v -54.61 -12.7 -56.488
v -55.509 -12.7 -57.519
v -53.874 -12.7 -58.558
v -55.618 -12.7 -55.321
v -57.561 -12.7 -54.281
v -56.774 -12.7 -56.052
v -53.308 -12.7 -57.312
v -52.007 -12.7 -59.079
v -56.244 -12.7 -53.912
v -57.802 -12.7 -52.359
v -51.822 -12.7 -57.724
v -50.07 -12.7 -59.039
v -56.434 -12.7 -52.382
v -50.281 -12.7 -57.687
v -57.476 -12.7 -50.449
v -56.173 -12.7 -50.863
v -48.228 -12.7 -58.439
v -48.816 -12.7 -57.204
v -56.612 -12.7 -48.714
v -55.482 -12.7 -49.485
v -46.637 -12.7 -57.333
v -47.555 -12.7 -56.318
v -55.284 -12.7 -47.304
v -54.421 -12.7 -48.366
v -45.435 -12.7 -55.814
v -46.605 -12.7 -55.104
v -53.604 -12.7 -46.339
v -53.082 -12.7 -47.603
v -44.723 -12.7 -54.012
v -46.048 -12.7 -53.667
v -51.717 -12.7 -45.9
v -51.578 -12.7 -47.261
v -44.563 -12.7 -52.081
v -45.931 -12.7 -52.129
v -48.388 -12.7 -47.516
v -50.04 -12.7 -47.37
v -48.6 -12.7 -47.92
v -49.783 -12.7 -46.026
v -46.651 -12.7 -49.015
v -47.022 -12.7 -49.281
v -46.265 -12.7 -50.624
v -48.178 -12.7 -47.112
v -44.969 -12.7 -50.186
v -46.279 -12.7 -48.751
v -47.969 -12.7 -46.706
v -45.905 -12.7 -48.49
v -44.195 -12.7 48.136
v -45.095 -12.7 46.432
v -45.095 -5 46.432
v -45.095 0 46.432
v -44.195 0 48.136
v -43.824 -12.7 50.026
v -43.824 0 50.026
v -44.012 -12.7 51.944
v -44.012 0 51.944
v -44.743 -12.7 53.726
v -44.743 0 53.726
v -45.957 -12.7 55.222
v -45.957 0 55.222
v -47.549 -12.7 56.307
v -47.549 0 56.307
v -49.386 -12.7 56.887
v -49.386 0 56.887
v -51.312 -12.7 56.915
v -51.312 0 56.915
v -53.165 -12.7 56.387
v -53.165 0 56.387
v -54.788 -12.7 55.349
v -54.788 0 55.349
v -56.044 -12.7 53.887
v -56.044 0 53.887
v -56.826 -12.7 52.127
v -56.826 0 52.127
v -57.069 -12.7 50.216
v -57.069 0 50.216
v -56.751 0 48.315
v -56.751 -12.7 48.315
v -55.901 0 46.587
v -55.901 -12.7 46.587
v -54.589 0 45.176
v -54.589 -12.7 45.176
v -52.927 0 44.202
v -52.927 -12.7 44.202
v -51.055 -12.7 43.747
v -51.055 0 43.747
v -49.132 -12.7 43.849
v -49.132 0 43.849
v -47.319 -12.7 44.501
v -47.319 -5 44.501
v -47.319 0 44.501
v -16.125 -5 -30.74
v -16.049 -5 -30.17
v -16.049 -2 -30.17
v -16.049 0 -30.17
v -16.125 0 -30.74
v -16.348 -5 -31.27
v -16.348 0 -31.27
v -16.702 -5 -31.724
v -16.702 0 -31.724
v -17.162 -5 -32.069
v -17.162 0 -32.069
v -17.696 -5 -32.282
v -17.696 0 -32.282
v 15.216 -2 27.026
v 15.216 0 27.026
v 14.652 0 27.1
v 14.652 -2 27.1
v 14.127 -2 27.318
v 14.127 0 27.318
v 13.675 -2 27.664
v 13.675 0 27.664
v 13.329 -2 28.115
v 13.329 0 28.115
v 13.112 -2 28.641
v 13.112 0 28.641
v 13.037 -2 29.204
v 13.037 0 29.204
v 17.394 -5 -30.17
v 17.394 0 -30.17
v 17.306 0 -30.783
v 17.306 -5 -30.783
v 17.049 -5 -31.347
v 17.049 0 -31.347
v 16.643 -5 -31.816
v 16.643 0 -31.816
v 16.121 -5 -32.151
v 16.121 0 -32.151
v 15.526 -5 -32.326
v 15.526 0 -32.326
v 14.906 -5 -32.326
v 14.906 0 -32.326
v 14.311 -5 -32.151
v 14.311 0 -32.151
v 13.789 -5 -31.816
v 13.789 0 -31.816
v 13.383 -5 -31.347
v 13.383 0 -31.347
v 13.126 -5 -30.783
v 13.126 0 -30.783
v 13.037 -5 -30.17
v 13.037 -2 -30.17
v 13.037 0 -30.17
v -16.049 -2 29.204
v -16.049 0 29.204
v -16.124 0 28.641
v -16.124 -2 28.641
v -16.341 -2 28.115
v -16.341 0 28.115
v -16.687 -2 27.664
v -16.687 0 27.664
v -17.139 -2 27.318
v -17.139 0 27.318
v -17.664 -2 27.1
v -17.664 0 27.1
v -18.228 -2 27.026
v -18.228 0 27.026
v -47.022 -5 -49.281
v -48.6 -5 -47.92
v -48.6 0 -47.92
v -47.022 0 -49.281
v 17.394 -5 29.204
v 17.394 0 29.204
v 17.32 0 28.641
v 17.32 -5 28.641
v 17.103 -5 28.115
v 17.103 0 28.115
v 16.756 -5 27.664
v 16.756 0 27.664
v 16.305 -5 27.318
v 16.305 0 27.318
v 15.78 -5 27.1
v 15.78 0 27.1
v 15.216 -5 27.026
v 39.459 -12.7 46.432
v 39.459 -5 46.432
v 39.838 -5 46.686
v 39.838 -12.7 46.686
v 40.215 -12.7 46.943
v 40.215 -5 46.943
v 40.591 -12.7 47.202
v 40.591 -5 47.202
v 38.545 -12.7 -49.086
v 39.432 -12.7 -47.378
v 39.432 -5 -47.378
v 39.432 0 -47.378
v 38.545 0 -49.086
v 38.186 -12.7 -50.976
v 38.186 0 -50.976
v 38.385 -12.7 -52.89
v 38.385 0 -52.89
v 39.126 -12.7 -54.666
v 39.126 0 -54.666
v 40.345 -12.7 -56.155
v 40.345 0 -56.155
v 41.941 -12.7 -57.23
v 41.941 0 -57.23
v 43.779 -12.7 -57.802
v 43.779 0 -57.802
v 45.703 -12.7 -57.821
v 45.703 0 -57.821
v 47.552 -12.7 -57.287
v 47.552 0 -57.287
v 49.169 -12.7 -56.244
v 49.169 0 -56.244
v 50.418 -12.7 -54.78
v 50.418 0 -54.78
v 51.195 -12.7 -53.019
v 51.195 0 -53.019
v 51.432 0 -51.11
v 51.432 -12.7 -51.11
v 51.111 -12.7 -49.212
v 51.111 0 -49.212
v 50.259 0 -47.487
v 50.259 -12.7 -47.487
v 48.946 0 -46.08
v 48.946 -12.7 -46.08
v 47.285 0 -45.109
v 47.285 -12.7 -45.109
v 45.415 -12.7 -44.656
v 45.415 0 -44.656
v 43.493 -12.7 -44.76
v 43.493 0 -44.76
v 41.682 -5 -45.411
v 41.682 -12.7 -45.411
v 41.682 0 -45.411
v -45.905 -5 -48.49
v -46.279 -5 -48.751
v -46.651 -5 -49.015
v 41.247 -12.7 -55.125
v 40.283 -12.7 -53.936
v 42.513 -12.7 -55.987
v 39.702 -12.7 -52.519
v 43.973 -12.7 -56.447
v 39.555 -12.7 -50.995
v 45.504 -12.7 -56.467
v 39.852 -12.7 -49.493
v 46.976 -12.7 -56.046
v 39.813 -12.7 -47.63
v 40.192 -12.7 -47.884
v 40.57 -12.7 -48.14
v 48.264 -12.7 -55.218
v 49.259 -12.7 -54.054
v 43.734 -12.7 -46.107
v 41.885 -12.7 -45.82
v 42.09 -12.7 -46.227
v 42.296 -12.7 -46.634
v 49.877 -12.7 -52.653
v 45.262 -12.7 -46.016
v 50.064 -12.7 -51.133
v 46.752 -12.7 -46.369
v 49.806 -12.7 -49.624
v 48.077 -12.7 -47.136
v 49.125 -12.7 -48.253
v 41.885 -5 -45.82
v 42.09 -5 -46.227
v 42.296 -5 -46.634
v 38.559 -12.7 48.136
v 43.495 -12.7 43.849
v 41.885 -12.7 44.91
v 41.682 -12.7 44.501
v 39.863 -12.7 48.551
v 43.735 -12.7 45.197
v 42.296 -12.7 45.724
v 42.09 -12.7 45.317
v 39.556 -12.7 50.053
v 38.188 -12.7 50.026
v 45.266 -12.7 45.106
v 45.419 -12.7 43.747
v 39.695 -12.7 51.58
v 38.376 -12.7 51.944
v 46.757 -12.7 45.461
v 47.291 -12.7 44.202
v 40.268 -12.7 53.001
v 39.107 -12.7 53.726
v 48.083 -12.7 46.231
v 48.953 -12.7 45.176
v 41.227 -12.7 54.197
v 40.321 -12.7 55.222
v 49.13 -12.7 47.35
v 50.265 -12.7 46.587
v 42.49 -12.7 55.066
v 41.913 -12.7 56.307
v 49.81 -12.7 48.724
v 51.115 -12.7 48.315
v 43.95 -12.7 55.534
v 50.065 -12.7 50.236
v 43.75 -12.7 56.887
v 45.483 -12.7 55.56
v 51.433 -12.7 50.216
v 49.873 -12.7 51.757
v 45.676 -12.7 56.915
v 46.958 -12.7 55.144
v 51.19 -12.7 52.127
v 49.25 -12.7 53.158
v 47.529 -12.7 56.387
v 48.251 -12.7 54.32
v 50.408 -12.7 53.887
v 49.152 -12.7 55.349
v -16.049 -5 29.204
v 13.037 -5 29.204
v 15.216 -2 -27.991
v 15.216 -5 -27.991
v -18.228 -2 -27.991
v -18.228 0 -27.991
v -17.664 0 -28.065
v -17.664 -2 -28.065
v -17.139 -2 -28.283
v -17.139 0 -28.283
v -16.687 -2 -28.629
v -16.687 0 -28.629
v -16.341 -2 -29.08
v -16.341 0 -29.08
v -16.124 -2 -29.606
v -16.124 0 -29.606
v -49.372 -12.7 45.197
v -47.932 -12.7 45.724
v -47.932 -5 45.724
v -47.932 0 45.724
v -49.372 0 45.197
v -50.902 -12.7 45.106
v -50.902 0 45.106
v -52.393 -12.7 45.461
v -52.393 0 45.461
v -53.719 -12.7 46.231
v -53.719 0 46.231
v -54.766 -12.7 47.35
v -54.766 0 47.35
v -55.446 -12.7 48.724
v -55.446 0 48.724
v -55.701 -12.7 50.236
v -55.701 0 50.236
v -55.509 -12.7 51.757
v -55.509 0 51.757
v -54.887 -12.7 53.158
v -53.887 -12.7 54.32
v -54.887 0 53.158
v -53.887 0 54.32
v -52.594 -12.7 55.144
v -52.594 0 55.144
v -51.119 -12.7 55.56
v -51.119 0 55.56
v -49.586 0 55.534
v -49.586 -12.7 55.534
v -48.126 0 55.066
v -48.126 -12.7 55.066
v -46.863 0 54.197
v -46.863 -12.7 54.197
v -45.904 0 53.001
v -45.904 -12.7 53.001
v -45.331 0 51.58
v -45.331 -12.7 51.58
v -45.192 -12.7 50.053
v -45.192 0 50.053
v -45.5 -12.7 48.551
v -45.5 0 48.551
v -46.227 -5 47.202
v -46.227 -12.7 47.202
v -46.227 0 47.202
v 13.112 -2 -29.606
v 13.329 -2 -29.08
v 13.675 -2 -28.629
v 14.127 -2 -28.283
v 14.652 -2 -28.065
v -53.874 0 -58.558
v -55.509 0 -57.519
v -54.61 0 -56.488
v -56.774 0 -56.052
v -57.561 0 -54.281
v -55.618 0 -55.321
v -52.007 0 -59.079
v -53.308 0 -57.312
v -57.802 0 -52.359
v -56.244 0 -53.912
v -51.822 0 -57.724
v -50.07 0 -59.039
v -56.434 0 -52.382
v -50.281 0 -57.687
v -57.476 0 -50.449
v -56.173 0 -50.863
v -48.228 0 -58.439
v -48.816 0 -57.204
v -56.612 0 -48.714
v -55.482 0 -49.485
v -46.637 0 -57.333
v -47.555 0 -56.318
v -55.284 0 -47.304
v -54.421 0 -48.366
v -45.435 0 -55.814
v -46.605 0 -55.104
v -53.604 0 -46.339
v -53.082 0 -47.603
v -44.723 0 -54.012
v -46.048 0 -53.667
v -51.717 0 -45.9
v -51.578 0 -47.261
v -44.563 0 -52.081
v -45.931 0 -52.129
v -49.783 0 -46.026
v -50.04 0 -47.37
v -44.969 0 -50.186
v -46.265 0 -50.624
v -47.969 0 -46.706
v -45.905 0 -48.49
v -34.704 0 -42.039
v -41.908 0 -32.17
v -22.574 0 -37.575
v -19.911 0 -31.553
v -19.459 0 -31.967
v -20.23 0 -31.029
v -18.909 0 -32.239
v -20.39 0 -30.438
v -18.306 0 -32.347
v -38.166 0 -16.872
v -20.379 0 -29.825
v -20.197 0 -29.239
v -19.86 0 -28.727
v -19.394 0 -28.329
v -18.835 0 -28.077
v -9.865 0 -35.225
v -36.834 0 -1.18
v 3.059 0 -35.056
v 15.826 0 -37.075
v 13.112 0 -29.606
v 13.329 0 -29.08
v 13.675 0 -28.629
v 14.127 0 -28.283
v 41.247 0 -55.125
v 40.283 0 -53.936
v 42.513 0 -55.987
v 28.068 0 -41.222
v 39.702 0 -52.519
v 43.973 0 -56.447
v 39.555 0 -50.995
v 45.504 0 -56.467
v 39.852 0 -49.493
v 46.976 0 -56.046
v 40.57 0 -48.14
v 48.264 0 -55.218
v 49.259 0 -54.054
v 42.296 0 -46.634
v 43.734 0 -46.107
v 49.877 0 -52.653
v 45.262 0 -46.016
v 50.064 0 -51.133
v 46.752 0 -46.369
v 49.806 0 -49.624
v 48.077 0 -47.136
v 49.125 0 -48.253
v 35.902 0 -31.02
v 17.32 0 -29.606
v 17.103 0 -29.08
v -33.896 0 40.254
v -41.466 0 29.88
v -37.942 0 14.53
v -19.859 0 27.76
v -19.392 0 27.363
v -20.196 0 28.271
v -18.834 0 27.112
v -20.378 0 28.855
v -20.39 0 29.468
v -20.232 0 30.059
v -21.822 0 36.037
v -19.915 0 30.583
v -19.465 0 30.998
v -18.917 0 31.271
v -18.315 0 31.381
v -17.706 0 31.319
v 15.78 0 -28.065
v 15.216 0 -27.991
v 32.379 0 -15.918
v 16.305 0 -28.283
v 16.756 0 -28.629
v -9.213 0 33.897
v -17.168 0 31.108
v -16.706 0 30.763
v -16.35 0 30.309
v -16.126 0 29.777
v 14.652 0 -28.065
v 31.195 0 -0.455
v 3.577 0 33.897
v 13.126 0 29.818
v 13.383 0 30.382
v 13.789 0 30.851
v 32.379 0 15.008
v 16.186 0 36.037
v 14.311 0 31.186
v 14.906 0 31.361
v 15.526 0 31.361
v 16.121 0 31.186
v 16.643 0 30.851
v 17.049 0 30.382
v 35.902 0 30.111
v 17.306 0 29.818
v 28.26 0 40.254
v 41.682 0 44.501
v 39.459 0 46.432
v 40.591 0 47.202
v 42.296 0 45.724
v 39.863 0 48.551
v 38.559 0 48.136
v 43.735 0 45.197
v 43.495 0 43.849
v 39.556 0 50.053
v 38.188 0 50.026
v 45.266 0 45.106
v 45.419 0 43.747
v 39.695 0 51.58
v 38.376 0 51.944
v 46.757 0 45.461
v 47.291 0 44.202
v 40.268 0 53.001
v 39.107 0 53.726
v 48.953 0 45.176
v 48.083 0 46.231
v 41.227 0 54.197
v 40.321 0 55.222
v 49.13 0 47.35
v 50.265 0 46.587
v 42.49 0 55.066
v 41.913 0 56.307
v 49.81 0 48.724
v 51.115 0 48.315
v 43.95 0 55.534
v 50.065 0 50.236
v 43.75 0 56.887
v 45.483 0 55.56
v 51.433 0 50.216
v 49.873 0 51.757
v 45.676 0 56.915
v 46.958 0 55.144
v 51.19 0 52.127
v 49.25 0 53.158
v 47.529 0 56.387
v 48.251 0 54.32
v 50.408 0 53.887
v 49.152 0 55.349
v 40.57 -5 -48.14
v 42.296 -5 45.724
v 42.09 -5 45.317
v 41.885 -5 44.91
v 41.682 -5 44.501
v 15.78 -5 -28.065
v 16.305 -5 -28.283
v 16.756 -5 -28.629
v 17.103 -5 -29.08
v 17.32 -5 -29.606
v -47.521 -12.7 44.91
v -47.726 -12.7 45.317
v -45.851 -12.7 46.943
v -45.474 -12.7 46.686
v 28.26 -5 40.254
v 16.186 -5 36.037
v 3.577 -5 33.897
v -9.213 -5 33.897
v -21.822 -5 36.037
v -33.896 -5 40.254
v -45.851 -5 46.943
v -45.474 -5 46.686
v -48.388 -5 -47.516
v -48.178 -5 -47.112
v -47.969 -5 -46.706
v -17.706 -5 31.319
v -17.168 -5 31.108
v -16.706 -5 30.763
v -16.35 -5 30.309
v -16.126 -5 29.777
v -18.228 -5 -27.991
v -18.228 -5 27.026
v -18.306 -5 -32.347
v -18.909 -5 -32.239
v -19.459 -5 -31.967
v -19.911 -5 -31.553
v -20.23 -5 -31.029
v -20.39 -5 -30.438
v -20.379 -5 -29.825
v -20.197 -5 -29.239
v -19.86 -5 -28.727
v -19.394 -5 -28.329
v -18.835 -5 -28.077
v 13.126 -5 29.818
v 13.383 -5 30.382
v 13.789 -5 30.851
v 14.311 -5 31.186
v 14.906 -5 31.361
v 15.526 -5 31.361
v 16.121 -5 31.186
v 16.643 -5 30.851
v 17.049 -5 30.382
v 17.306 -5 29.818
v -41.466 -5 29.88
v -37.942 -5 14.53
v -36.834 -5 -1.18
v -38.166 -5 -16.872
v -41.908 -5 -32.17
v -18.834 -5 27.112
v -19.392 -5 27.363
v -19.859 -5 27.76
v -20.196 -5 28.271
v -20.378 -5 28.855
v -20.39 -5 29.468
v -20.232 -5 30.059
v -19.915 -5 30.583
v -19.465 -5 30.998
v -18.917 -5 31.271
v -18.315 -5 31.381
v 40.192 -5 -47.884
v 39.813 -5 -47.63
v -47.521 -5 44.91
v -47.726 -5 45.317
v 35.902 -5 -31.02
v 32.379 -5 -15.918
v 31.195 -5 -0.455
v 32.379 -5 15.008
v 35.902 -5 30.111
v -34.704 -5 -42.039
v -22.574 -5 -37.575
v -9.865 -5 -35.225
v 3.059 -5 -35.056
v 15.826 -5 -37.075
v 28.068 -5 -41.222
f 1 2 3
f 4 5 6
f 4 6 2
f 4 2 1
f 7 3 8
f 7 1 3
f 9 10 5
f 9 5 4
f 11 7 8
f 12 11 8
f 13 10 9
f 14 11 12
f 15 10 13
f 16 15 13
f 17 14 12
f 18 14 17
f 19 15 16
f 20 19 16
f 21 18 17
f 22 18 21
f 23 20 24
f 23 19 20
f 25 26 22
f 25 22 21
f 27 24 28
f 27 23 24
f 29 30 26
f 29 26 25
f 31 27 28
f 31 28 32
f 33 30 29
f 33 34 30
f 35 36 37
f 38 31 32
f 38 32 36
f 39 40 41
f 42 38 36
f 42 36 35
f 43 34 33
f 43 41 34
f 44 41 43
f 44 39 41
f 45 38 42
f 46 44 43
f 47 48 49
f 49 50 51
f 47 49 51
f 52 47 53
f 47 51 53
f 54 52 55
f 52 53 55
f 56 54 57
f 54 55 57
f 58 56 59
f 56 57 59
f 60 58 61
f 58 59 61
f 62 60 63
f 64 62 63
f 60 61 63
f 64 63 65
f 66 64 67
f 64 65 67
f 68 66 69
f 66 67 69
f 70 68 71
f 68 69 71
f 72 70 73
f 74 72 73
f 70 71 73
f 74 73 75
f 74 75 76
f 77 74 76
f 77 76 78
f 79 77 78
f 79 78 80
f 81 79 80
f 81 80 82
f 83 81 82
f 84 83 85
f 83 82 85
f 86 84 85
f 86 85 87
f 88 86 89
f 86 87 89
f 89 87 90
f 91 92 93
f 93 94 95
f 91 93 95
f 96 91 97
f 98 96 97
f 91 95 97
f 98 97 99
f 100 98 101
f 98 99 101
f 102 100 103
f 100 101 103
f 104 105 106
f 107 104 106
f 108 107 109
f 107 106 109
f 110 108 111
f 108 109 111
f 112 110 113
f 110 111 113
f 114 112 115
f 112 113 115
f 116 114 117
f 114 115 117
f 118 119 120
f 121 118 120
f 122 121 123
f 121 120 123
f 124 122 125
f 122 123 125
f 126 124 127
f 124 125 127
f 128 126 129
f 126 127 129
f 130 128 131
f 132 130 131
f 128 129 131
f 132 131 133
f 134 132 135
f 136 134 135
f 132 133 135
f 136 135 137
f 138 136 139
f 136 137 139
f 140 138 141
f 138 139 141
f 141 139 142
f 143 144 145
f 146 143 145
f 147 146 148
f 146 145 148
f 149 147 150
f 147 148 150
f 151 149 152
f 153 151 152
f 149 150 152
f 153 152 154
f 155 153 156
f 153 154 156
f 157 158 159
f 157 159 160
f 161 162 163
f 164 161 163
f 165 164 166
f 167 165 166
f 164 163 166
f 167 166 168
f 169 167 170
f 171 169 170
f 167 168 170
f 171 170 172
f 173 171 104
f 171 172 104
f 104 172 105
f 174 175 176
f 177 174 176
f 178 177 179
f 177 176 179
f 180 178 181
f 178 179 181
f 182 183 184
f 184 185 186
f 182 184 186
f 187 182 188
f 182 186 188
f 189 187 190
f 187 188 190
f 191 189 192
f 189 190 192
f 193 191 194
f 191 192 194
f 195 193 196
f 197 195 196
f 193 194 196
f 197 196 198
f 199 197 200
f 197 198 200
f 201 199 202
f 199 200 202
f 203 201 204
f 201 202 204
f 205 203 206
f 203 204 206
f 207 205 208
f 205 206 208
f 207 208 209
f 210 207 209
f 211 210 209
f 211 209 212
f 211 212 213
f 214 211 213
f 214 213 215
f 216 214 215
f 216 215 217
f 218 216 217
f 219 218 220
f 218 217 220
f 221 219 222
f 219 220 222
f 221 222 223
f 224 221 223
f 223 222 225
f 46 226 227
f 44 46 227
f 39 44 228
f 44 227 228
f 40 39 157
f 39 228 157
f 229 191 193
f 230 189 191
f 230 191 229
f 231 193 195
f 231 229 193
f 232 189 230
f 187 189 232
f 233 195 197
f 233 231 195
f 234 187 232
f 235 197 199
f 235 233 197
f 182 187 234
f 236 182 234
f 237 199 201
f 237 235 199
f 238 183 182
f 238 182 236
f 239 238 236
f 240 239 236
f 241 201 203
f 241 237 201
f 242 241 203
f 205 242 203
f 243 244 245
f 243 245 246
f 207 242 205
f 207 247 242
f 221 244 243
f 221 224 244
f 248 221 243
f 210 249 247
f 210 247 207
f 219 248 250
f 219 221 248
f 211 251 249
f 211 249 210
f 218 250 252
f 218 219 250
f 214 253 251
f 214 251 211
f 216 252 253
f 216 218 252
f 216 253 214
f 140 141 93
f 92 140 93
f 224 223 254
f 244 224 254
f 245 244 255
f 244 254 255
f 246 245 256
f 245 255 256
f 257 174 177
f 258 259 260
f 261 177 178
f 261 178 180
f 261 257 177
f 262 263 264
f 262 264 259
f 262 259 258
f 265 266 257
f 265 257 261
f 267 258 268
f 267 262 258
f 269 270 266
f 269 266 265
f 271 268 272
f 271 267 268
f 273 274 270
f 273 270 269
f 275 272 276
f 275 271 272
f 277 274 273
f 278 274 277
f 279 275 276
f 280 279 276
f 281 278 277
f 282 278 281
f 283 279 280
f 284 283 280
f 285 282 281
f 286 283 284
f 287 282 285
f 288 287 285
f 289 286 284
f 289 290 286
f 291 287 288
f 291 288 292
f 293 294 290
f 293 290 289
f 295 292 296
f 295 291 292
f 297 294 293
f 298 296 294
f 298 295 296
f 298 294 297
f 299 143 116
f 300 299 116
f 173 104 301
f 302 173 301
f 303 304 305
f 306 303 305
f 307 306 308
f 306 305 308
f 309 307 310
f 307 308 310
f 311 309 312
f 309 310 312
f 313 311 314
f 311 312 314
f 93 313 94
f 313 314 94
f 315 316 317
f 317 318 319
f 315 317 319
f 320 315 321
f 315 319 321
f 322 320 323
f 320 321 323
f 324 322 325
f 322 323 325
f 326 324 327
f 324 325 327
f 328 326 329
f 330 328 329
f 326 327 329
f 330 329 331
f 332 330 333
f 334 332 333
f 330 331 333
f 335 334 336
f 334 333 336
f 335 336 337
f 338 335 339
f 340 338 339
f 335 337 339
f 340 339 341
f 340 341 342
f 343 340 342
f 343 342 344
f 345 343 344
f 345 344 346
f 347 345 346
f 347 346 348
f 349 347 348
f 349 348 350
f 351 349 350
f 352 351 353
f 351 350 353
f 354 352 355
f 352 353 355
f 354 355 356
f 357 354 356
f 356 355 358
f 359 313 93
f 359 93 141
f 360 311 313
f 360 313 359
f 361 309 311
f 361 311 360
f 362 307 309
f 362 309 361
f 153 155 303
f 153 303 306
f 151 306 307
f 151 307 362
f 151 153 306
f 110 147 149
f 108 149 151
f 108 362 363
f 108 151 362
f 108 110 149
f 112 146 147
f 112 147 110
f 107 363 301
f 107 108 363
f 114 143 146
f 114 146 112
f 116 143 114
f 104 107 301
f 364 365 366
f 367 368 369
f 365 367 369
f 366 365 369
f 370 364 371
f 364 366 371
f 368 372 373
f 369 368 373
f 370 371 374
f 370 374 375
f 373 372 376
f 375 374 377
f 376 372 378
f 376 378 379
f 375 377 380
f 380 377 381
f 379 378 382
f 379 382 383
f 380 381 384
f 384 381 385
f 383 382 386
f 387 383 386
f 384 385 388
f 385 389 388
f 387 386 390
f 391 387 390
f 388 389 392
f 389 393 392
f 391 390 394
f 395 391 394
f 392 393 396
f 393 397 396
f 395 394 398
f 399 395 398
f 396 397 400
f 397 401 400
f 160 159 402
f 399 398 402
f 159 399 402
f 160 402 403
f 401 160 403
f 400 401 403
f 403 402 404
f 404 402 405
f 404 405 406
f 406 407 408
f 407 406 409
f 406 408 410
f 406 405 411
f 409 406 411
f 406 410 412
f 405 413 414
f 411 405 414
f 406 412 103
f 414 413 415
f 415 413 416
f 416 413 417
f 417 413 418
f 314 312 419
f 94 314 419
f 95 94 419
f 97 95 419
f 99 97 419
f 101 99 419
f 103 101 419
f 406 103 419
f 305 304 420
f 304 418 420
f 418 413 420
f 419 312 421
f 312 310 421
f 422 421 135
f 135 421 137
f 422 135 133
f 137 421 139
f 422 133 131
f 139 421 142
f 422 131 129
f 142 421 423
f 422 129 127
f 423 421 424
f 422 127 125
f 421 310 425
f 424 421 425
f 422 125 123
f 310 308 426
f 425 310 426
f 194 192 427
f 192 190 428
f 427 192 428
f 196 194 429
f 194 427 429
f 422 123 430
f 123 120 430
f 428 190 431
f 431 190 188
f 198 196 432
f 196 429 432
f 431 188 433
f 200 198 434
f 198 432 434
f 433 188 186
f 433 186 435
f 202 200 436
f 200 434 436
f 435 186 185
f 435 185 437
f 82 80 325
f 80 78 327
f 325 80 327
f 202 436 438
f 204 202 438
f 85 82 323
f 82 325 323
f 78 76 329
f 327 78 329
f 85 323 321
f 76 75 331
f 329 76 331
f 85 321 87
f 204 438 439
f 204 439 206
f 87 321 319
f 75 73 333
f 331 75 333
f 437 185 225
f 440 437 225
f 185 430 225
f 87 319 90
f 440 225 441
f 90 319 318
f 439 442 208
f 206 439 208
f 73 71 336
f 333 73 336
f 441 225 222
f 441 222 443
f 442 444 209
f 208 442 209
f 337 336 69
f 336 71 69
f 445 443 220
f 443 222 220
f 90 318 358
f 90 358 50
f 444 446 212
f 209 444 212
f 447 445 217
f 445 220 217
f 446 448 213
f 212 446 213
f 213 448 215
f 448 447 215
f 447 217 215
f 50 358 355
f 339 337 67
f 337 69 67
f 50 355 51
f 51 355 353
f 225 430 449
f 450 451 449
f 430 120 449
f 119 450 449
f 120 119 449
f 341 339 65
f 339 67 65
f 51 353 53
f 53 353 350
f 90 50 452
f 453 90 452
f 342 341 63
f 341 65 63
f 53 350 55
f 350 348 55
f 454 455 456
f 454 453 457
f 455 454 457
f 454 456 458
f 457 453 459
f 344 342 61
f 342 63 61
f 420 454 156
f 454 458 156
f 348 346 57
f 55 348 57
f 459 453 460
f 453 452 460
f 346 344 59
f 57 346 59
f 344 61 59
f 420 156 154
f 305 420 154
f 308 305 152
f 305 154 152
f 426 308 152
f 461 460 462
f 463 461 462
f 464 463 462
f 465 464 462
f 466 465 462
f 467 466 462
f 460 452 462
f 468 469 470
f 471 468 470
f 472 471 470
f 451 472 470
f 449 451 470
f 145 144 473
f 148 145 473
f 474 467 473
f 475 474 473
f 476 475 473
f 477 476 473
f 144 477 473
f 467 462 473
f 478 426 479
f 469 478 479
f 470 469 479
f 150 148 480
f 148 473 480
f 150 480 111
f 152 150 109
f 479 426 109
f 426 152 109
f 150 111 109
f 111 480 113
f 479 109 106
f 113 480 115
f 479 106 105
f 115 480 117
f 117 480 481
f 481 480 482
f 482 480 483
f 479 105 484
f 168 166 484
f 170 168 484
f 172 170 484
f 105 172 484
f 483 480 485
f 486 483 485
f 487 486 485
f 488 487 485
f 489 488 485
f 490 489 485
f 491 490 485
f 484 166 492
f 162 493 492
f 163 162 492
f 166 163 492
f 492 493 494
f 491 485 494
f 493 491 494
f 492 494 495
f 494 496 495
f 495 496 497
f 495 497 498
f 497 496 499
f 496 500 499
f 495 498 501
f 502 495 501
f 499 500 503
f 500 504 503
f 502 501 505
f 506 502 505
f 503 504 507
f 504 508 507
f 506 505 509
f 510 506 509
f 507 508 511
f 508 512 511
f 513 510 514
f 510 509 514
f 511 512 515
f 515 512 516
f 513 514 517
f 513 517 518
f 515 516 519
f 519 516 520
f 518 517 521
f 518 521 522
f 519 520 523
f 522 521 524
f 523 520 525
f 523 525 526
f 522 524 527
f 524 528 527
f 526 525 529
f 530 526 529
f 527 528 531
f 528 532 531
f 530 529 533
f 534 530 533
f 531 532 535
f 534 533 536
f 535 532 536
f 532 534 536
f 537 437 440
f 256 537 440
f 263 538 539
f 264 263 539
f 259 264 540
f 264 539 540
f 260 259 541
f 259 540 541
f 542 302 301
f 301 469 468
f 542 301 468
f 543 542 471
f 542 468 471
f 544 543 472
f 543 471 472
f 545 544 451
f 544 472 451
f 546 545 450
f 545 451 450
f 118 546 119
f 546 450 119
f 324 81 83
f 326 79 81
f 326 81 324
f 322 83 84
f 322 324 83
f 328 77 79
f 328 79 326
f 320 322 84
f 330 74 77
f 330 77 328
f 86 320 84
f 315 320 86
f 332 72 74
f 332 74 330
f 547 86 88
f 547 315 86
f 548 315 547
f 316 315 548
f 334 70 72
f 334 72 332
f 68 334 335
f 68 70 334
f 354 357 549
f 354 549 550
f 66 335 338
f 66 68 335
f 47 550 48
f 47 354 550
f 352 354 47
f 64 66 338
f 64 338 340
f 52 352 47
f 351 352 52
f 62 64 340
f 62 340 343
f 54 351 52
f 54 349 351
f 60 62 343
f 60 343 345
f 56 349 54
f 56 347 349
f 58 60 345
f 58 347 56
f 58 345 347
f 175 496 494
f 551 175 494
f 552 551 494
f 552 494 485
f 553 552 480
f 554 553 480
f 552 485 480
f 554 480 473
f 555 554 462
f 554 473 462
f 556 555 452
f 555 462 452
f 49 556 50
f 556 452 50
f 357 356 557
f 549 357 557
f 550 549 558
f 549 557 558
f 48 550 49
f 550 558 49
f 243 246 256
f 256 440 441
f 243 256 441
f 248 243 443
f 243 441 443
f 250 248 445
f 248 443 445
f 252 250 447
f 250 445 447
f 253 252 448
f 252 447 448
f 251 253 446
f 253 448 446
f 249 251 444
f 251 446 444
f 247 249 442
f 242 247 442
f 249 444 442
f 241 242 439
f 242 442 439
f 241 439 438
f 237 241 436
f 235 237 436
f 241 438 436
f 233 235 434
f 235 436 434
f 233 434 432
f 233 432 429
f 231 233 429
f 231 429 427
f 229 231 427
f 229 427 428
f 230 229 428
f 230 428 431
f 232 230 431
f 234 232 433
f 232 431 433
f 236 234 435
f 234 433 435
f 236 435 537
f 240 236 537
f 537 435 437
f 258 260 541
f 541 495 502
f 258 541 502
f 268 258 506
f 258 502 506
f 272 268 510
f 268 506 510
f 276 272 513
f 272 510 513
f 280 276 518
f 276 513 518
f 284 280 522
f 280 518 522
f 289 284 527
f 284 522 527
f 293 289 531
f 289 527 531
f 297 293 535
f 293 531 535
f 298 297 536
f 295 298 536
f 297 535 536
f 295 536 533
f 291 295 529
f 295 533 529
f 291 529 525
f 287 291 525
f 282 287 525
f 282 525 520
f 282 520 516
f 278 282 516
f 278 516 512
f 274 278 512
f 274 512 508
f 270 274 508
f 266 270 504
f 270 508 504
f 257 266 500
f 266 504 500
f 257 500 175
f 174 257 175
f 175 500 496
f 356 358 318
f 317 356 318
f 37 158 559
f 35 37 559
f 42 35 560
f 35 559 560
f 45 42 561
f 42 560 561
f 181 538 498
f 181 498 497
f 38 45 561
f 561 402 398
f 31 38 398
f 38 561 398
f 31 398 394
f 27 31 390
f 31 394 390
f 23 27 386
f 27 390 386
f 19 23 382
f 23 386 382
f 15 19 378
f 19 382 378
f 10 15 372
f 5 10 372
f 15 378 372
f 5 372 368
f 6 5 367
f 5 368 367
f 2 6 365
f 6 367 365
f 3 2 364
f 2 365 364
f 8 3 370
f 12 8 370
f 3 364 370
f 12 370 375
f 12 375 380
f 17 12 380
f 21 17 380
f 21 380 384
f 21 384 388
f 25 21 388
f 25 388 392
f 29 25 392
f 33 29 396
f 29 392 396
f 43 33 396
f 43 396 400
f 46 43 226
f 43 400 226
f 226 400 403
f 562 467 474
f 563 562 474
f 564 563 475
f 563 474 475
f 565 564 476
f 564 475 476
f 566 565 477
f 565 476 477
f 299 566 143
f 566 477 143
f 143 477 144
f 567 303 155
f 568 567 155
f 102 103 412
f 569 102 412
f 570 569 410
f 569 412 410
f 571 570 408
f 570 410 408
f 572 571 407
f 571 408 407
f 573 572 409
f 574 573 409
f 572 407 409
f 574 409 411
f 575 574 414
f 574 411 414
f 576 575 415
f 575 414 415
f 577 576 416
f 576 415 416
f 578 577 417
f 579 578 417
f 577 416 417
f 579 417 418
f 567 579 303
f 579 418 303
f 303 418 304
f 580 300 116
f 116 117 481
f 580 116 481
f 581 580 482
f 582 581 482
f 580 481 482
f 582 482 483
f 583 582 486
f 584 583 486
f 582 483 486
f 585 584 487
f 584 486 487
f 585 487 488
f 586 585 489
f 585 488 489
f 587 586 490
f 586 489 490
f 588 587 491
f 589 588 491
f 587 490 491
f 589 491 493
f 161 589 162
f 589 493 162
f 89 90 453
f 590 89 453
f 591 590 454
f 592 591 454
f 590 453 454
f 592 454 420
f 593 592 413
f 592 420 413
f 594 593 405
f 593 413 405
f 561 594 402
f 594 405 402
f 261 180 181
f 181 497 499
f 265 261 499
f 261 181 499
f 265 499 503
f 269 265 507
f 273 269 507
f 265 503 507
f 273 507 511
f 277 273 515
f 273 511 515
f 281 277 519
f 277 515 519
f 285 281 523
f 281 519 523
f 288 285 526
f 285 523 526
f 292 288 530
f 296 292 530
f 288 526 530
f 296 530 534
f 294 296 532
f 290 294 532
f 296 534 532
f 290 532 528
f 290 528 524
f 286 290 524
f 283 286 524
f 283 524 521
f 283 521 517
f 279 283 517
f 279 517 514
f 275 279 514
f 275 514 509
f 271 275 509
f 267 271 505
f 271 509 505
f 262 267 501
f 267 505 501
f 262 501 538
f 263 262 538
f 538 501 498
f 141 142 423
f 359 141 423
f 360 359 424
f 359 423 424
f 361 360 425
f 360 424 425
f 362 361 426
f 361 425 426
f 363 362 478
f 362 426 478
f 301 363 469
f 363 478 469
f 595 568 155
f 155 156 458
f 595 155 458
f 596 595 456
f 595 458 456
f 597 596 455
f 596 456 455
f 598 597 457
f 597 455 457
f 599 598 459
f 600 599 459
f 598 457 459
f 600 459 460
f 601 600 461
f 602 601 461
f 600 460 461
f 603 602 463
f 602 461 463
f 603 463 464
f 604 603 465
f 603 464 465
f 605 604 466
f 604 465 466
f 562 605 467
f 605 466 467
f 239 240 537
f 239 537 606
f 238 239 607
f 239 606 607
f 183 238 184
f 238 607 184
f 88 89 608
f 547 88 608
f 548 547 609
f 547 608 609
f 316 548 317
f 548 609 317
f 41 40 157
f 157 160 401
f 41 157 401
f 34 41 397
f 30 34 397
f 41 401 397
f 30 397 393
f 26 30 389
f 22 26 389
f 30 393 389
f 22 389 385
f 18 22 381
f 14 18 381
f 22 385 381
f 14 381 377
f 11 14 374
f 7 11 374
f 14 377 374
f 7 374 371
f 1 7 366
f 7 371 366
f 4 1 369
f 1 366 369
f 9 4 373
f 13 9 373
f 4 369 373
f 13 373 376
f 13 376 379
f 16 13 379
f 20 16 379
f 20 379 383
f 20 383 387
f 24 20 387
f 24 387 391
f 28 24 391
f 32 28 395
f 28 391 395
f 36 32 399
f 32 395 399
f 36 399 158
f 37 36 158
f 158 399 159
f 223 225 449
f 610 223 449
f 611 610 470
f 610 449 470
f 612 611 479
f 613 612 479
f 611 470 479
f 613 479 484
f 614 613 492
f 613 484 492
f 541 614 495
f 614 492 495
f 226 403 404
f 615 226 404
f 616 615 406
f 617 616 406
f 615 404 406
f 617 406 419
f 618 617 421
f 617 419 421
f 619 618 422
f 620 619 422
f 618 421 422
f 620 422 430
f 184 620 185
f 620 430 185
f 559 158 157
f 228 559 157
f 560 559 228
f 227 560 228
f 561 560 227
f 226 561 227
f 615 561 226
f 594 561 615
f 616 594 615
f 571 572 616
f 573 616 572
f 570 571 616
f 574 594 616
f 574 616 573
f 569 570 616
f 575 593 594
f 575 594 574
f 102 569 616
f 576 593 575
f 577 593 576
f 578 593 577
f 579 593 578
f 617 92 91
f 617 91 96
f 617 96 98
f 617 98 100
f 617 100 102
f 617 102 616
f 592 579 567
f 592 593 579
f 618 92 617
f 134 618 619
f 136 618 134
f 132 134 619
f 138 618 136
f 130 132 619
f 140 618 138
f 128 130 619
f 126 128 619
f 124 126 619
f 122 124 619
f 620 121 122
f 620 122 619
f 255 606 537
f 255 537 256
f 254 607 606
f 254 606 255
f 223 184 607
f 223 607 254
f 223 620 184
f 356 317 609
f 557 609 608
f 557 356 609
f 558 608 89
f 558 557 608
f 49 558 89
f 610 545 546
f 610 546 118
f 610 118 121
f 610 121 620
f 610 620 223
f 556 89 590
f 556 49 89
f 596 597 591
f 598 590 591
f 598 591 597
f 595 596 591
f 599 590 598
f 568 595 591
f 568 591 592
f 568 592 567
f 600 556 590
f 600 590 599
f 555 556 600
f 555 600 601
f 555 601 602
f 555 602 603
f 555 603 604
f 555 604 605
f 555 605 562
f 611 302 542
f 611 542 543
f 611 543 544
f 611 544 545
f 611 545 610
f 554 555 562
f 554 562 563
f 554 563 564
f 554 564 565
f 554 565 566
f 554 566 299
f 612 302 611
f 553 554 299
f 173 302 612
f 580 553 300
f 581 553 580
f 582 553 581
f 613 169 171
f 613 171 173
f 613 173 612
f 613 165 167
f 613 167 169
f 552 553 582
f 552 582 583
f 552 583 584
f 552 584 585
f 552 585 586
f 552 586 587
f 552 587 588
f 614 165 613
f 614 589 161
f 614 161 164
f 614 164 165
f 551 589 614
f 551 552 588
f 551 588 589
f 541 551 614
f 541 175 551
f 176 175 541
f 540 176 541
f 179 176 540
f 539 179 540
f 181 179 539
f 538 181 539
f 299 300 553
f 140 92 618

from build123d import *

# Parameters (mm, degrees)
F1_DEPTH = 5
F2_DEPTH = 12.7
F3_DEPTH = 2


with BuildPart() as f1:
    # F0 (on Front) → F1 (new body)
    with BuildSketch(Plane.XZ):
        with BuildLine():
            ThreePointArc((39.432288, -47.378316), (40.00265, -47.756794), (40.569589, -48.140379))
            ThreePointArc((40.569589, -48.140379), (13.513407, -32.581288), (-17.696093, -32.282251))
            ThreePointArc((-17.696093, -32.282251), (-33.551282, -38.724603), (-47.021789, -49.280947))
            ThreePointArc((-47.021789, -49.280947), (-46.46503, -48.882729), (-45.904716, -48.489528))
            ThreePointArc((-45.904716, -48.489528), (-3.406376, -34.866086), (39.432288, -47.378316))
        make_face()
        with BuildLine():
            ThreePointArc((-47.932388, 45.724251), (-47.623421, 45.113689), (-47.318573, 44.50106))
            ThreePointArc((-47.318573, 44.50106), (-36.833831, -1.179528), (-47.969069, -46.70592))
            ThreePointArc((-47.969069, -46.70592), (-48.282623, -47.314139), (-48.600267, -47.920232))
            ThreePointArc((-48.600267, -47.920232), (-31.75396, -1.215758), (-47.932388, 45.724251))
        make_face()
        with BuildLine():
            ThreePointArc((-17.705524, 31.319402), (13.504642, 31.692077), (40.590774, 47.201906))
            ThreePointArc((40.590774, 47.201906), (40.026445, 46.814491), (39.458658, 46.43216))
            ThreePointArc((39.458658, 46.43216), (-2.818066, 33.628679), (-45.09479, 46.43216))
            ThreePointArc((-45.09479, 46.43216), (-45.662576, 46.814491), (-46.226906, 47.201906))
            ThreePointArc((-46.226906, 47.201906), (-33.028628, 37.3528), (-17.705524, 31.319402))
        make_face()
        with BuildLine():
            ThreePointArc((41.682442, 44.50106), (41.987289, 45.113689), (42.296256, 45.724251))
            ThreePointArc((42.296256, 45.724251), (25.839489, -0.454927), (42.296256, -46.634105))
            ThreePointArc((42.296256, -46.634105), (41.987289, -46.023543), (41.682442, -45.410914))
            ThreePointArc((41.682442, -45.410914), (31.195115, -0.454927), (41.682442, 44.50106))
        make_face()
        with BuildLine():
            ThreePointArc((-18.227816, 27.025968), (-20.390359, 29.467524), (-17.705524, 31.319402))
            ThreePointArc((-17.705524, 31.319402), (-33.028628, 37.3528), (-46.226906, 47.201906))
            Line((-46.226906, 47.201906), (-47.932388, 45.724251))
            ThreePointArc((-47.932388, 45.724251), (-31.75396, -1.215758), (-48.600267, -47.920232))
            Line((-48.600267, -47.920232), (-47.021789, -49.280947))
            ThreePointArc((-47.021789, -49.280947), (-33.551282, -38.724603), (-17.696093, -32.282251))
            ThreePointArc((-17.696093, -32.282251), (-20.389766, -30.437547), (-18.227816, -27.991167))
            Line((-18.227816, -27.991167), (-18.227816, 27.025968))
        make_face()
        with BuildLine():
            ThreePointArc((42.296256, -46.634105), (25.839489, -0.454927), (42.296256, 45.724251))
            Line((42.296256, 45.724251), (40.590774, 47.201906))
            ThreePointArc((40.590774, 47.201906), (13.504642, 31.692077), (-17.705524, 31.319402))
            ThreePointArc((-17.705524, 31.319402), (-16.512648, 30.547582), (-16.04933, 29.204453))
            Line((-16.04933, 29.204453), (13.037413, 29.204453))
            ThreePointArc((13.037413, 29.204453), (15.215898, 31.382938), (17.394383, 29.204453))
            ThreePointArc((17.394383, 29.204453), (16.75632, 27.664031), (15.215898, 27.025968))
            Line((15.215898, 27.025968), (15.215898, -27.991167))
            ThreePointArc((15.215898, -27.991167), (16.75632, -28.629231), (17.394383, -30.169653))
            ThreePointArc((17.394383, -30.169653), (15.215898, -32.348138), (13.037413, -30.169653))
            Line((13.037413, -30.169653), (-16.04933, -30.169653))
            ThreePointArc((-16.04933, -30.169653), (-16.509656, -31.508953), (-17.696093, -32.282251))
            ThreePointArc((-17.696093, -32.282251), (13.513407, -32.581288), (40.569589, -48.140379))
            Line((40.569589, -48.140379), (42.296256, -46.634105))
        make_face()
    extrude(amount=F1_DEPTH)

    # F0 (on Front) → F2 (join)
    with BuildSketch(Plane.XZ):
        with BuildLine():
            ThreePointArc((-46.226906, 47.201906), (-45.662576, 46.814491), (-45.09479, 46.43216))
            ThreePointArc((-45.09479, 46.43216), (-54.78809, 55.348642), (-47.318573, 44.50106))
            ThreePointArc((-47.318573, 44.50106), (-47.623421, 45.113689), (-47.932388, 45.724251))
            ThreePointArc((-47.932388, 45.724251), (-53.886676, 54.319623), (-46.226906, 47.201906))
        make_face()
        with BuildLine():
            ThreePointArc((40.590774, 47.201906), (48.250545, 54.319623), (42.296256, 45.724251))
            ThreePointArc((42.296256, 45.724251), (41.987289, 45.113689), (41.682442, 44.50106))
            ThreePointArc((41.682442, 44.50106), (49.151959, 55.348642), (39.458658, 46.43216))
            ThreePointArc((39.458658, 46.43216), (40.026445, 46.814491), (40.590774, 47.201906))
        make_face()
        with BuildLine():
            ThreePointArc((41.682442, -45.410914), (41.987289, -46.023543), (42.296256, -46.634105))
            ThreePointArc((42.296256, -46.634105), (48.263981, -55.217796), (40.569589, -48.140379))
            ThreePointArc((40.569589, -48.140379), (40.00265, -47.756794), (39.432288, -47.378316))
            ThreePointArc((39.432288, -47.378316), (49.168873, -56.243758), (41.682442, -45.410914))
        make_face()
        with BuildLine():
            ThreePointArc((-47.969069, -46.70592), (-55.509084, -57.519203), (-45.904716, -48.489528))
            ThreePointArc((-45.904716, -48.489528), (-46.46503, -48.882729), (-47.021789, -49.280947))
            ThreePointArc((-47.021789, -49.280947), (-54.610249, -56.487931), (-48.600267, -47.920232))
            ThreePointArc((-48.600267, -47.920232), (-48.282623, -47.314139), (-47.969069, -46.70592))
        make_face()
    extrude(amount=F2_DEPTH)

    # F0 (on Front) → F3 (join)
    with BuildSketch(Plane.XZ):
        with BuildLine():
            Line((13.037413, 29.204453), (-16.04933, 29.204453))
            ThreePointArc((-16.04933, 29.204453), (-16.687394, 27.664031), (-18.227816, 27.025968))
            Line((-18.227816, 27.025968), (-18.227816, -27.991167))
            ThreePointArc((-18.227816, -27.991167), (-16.687394, -28.629231), (-16.04933, -30.169653))
            Line((-16.04933, -30.169653), (13.037413, -30.169653))
            ThreePointArc((13.037413, -30.169653), (13.675476, -28.629231), (15.215898, -27.991167))
            Line((15.215898, -27.991167), (15.215898, 27.025968))
            ThreePointArc((15.215898, 27.025968), (13.675476, 27.664031), (13.037413, 29.204453))
        make_face()
    extrude(amount=F3_DEPTH)


solid = f1.part
